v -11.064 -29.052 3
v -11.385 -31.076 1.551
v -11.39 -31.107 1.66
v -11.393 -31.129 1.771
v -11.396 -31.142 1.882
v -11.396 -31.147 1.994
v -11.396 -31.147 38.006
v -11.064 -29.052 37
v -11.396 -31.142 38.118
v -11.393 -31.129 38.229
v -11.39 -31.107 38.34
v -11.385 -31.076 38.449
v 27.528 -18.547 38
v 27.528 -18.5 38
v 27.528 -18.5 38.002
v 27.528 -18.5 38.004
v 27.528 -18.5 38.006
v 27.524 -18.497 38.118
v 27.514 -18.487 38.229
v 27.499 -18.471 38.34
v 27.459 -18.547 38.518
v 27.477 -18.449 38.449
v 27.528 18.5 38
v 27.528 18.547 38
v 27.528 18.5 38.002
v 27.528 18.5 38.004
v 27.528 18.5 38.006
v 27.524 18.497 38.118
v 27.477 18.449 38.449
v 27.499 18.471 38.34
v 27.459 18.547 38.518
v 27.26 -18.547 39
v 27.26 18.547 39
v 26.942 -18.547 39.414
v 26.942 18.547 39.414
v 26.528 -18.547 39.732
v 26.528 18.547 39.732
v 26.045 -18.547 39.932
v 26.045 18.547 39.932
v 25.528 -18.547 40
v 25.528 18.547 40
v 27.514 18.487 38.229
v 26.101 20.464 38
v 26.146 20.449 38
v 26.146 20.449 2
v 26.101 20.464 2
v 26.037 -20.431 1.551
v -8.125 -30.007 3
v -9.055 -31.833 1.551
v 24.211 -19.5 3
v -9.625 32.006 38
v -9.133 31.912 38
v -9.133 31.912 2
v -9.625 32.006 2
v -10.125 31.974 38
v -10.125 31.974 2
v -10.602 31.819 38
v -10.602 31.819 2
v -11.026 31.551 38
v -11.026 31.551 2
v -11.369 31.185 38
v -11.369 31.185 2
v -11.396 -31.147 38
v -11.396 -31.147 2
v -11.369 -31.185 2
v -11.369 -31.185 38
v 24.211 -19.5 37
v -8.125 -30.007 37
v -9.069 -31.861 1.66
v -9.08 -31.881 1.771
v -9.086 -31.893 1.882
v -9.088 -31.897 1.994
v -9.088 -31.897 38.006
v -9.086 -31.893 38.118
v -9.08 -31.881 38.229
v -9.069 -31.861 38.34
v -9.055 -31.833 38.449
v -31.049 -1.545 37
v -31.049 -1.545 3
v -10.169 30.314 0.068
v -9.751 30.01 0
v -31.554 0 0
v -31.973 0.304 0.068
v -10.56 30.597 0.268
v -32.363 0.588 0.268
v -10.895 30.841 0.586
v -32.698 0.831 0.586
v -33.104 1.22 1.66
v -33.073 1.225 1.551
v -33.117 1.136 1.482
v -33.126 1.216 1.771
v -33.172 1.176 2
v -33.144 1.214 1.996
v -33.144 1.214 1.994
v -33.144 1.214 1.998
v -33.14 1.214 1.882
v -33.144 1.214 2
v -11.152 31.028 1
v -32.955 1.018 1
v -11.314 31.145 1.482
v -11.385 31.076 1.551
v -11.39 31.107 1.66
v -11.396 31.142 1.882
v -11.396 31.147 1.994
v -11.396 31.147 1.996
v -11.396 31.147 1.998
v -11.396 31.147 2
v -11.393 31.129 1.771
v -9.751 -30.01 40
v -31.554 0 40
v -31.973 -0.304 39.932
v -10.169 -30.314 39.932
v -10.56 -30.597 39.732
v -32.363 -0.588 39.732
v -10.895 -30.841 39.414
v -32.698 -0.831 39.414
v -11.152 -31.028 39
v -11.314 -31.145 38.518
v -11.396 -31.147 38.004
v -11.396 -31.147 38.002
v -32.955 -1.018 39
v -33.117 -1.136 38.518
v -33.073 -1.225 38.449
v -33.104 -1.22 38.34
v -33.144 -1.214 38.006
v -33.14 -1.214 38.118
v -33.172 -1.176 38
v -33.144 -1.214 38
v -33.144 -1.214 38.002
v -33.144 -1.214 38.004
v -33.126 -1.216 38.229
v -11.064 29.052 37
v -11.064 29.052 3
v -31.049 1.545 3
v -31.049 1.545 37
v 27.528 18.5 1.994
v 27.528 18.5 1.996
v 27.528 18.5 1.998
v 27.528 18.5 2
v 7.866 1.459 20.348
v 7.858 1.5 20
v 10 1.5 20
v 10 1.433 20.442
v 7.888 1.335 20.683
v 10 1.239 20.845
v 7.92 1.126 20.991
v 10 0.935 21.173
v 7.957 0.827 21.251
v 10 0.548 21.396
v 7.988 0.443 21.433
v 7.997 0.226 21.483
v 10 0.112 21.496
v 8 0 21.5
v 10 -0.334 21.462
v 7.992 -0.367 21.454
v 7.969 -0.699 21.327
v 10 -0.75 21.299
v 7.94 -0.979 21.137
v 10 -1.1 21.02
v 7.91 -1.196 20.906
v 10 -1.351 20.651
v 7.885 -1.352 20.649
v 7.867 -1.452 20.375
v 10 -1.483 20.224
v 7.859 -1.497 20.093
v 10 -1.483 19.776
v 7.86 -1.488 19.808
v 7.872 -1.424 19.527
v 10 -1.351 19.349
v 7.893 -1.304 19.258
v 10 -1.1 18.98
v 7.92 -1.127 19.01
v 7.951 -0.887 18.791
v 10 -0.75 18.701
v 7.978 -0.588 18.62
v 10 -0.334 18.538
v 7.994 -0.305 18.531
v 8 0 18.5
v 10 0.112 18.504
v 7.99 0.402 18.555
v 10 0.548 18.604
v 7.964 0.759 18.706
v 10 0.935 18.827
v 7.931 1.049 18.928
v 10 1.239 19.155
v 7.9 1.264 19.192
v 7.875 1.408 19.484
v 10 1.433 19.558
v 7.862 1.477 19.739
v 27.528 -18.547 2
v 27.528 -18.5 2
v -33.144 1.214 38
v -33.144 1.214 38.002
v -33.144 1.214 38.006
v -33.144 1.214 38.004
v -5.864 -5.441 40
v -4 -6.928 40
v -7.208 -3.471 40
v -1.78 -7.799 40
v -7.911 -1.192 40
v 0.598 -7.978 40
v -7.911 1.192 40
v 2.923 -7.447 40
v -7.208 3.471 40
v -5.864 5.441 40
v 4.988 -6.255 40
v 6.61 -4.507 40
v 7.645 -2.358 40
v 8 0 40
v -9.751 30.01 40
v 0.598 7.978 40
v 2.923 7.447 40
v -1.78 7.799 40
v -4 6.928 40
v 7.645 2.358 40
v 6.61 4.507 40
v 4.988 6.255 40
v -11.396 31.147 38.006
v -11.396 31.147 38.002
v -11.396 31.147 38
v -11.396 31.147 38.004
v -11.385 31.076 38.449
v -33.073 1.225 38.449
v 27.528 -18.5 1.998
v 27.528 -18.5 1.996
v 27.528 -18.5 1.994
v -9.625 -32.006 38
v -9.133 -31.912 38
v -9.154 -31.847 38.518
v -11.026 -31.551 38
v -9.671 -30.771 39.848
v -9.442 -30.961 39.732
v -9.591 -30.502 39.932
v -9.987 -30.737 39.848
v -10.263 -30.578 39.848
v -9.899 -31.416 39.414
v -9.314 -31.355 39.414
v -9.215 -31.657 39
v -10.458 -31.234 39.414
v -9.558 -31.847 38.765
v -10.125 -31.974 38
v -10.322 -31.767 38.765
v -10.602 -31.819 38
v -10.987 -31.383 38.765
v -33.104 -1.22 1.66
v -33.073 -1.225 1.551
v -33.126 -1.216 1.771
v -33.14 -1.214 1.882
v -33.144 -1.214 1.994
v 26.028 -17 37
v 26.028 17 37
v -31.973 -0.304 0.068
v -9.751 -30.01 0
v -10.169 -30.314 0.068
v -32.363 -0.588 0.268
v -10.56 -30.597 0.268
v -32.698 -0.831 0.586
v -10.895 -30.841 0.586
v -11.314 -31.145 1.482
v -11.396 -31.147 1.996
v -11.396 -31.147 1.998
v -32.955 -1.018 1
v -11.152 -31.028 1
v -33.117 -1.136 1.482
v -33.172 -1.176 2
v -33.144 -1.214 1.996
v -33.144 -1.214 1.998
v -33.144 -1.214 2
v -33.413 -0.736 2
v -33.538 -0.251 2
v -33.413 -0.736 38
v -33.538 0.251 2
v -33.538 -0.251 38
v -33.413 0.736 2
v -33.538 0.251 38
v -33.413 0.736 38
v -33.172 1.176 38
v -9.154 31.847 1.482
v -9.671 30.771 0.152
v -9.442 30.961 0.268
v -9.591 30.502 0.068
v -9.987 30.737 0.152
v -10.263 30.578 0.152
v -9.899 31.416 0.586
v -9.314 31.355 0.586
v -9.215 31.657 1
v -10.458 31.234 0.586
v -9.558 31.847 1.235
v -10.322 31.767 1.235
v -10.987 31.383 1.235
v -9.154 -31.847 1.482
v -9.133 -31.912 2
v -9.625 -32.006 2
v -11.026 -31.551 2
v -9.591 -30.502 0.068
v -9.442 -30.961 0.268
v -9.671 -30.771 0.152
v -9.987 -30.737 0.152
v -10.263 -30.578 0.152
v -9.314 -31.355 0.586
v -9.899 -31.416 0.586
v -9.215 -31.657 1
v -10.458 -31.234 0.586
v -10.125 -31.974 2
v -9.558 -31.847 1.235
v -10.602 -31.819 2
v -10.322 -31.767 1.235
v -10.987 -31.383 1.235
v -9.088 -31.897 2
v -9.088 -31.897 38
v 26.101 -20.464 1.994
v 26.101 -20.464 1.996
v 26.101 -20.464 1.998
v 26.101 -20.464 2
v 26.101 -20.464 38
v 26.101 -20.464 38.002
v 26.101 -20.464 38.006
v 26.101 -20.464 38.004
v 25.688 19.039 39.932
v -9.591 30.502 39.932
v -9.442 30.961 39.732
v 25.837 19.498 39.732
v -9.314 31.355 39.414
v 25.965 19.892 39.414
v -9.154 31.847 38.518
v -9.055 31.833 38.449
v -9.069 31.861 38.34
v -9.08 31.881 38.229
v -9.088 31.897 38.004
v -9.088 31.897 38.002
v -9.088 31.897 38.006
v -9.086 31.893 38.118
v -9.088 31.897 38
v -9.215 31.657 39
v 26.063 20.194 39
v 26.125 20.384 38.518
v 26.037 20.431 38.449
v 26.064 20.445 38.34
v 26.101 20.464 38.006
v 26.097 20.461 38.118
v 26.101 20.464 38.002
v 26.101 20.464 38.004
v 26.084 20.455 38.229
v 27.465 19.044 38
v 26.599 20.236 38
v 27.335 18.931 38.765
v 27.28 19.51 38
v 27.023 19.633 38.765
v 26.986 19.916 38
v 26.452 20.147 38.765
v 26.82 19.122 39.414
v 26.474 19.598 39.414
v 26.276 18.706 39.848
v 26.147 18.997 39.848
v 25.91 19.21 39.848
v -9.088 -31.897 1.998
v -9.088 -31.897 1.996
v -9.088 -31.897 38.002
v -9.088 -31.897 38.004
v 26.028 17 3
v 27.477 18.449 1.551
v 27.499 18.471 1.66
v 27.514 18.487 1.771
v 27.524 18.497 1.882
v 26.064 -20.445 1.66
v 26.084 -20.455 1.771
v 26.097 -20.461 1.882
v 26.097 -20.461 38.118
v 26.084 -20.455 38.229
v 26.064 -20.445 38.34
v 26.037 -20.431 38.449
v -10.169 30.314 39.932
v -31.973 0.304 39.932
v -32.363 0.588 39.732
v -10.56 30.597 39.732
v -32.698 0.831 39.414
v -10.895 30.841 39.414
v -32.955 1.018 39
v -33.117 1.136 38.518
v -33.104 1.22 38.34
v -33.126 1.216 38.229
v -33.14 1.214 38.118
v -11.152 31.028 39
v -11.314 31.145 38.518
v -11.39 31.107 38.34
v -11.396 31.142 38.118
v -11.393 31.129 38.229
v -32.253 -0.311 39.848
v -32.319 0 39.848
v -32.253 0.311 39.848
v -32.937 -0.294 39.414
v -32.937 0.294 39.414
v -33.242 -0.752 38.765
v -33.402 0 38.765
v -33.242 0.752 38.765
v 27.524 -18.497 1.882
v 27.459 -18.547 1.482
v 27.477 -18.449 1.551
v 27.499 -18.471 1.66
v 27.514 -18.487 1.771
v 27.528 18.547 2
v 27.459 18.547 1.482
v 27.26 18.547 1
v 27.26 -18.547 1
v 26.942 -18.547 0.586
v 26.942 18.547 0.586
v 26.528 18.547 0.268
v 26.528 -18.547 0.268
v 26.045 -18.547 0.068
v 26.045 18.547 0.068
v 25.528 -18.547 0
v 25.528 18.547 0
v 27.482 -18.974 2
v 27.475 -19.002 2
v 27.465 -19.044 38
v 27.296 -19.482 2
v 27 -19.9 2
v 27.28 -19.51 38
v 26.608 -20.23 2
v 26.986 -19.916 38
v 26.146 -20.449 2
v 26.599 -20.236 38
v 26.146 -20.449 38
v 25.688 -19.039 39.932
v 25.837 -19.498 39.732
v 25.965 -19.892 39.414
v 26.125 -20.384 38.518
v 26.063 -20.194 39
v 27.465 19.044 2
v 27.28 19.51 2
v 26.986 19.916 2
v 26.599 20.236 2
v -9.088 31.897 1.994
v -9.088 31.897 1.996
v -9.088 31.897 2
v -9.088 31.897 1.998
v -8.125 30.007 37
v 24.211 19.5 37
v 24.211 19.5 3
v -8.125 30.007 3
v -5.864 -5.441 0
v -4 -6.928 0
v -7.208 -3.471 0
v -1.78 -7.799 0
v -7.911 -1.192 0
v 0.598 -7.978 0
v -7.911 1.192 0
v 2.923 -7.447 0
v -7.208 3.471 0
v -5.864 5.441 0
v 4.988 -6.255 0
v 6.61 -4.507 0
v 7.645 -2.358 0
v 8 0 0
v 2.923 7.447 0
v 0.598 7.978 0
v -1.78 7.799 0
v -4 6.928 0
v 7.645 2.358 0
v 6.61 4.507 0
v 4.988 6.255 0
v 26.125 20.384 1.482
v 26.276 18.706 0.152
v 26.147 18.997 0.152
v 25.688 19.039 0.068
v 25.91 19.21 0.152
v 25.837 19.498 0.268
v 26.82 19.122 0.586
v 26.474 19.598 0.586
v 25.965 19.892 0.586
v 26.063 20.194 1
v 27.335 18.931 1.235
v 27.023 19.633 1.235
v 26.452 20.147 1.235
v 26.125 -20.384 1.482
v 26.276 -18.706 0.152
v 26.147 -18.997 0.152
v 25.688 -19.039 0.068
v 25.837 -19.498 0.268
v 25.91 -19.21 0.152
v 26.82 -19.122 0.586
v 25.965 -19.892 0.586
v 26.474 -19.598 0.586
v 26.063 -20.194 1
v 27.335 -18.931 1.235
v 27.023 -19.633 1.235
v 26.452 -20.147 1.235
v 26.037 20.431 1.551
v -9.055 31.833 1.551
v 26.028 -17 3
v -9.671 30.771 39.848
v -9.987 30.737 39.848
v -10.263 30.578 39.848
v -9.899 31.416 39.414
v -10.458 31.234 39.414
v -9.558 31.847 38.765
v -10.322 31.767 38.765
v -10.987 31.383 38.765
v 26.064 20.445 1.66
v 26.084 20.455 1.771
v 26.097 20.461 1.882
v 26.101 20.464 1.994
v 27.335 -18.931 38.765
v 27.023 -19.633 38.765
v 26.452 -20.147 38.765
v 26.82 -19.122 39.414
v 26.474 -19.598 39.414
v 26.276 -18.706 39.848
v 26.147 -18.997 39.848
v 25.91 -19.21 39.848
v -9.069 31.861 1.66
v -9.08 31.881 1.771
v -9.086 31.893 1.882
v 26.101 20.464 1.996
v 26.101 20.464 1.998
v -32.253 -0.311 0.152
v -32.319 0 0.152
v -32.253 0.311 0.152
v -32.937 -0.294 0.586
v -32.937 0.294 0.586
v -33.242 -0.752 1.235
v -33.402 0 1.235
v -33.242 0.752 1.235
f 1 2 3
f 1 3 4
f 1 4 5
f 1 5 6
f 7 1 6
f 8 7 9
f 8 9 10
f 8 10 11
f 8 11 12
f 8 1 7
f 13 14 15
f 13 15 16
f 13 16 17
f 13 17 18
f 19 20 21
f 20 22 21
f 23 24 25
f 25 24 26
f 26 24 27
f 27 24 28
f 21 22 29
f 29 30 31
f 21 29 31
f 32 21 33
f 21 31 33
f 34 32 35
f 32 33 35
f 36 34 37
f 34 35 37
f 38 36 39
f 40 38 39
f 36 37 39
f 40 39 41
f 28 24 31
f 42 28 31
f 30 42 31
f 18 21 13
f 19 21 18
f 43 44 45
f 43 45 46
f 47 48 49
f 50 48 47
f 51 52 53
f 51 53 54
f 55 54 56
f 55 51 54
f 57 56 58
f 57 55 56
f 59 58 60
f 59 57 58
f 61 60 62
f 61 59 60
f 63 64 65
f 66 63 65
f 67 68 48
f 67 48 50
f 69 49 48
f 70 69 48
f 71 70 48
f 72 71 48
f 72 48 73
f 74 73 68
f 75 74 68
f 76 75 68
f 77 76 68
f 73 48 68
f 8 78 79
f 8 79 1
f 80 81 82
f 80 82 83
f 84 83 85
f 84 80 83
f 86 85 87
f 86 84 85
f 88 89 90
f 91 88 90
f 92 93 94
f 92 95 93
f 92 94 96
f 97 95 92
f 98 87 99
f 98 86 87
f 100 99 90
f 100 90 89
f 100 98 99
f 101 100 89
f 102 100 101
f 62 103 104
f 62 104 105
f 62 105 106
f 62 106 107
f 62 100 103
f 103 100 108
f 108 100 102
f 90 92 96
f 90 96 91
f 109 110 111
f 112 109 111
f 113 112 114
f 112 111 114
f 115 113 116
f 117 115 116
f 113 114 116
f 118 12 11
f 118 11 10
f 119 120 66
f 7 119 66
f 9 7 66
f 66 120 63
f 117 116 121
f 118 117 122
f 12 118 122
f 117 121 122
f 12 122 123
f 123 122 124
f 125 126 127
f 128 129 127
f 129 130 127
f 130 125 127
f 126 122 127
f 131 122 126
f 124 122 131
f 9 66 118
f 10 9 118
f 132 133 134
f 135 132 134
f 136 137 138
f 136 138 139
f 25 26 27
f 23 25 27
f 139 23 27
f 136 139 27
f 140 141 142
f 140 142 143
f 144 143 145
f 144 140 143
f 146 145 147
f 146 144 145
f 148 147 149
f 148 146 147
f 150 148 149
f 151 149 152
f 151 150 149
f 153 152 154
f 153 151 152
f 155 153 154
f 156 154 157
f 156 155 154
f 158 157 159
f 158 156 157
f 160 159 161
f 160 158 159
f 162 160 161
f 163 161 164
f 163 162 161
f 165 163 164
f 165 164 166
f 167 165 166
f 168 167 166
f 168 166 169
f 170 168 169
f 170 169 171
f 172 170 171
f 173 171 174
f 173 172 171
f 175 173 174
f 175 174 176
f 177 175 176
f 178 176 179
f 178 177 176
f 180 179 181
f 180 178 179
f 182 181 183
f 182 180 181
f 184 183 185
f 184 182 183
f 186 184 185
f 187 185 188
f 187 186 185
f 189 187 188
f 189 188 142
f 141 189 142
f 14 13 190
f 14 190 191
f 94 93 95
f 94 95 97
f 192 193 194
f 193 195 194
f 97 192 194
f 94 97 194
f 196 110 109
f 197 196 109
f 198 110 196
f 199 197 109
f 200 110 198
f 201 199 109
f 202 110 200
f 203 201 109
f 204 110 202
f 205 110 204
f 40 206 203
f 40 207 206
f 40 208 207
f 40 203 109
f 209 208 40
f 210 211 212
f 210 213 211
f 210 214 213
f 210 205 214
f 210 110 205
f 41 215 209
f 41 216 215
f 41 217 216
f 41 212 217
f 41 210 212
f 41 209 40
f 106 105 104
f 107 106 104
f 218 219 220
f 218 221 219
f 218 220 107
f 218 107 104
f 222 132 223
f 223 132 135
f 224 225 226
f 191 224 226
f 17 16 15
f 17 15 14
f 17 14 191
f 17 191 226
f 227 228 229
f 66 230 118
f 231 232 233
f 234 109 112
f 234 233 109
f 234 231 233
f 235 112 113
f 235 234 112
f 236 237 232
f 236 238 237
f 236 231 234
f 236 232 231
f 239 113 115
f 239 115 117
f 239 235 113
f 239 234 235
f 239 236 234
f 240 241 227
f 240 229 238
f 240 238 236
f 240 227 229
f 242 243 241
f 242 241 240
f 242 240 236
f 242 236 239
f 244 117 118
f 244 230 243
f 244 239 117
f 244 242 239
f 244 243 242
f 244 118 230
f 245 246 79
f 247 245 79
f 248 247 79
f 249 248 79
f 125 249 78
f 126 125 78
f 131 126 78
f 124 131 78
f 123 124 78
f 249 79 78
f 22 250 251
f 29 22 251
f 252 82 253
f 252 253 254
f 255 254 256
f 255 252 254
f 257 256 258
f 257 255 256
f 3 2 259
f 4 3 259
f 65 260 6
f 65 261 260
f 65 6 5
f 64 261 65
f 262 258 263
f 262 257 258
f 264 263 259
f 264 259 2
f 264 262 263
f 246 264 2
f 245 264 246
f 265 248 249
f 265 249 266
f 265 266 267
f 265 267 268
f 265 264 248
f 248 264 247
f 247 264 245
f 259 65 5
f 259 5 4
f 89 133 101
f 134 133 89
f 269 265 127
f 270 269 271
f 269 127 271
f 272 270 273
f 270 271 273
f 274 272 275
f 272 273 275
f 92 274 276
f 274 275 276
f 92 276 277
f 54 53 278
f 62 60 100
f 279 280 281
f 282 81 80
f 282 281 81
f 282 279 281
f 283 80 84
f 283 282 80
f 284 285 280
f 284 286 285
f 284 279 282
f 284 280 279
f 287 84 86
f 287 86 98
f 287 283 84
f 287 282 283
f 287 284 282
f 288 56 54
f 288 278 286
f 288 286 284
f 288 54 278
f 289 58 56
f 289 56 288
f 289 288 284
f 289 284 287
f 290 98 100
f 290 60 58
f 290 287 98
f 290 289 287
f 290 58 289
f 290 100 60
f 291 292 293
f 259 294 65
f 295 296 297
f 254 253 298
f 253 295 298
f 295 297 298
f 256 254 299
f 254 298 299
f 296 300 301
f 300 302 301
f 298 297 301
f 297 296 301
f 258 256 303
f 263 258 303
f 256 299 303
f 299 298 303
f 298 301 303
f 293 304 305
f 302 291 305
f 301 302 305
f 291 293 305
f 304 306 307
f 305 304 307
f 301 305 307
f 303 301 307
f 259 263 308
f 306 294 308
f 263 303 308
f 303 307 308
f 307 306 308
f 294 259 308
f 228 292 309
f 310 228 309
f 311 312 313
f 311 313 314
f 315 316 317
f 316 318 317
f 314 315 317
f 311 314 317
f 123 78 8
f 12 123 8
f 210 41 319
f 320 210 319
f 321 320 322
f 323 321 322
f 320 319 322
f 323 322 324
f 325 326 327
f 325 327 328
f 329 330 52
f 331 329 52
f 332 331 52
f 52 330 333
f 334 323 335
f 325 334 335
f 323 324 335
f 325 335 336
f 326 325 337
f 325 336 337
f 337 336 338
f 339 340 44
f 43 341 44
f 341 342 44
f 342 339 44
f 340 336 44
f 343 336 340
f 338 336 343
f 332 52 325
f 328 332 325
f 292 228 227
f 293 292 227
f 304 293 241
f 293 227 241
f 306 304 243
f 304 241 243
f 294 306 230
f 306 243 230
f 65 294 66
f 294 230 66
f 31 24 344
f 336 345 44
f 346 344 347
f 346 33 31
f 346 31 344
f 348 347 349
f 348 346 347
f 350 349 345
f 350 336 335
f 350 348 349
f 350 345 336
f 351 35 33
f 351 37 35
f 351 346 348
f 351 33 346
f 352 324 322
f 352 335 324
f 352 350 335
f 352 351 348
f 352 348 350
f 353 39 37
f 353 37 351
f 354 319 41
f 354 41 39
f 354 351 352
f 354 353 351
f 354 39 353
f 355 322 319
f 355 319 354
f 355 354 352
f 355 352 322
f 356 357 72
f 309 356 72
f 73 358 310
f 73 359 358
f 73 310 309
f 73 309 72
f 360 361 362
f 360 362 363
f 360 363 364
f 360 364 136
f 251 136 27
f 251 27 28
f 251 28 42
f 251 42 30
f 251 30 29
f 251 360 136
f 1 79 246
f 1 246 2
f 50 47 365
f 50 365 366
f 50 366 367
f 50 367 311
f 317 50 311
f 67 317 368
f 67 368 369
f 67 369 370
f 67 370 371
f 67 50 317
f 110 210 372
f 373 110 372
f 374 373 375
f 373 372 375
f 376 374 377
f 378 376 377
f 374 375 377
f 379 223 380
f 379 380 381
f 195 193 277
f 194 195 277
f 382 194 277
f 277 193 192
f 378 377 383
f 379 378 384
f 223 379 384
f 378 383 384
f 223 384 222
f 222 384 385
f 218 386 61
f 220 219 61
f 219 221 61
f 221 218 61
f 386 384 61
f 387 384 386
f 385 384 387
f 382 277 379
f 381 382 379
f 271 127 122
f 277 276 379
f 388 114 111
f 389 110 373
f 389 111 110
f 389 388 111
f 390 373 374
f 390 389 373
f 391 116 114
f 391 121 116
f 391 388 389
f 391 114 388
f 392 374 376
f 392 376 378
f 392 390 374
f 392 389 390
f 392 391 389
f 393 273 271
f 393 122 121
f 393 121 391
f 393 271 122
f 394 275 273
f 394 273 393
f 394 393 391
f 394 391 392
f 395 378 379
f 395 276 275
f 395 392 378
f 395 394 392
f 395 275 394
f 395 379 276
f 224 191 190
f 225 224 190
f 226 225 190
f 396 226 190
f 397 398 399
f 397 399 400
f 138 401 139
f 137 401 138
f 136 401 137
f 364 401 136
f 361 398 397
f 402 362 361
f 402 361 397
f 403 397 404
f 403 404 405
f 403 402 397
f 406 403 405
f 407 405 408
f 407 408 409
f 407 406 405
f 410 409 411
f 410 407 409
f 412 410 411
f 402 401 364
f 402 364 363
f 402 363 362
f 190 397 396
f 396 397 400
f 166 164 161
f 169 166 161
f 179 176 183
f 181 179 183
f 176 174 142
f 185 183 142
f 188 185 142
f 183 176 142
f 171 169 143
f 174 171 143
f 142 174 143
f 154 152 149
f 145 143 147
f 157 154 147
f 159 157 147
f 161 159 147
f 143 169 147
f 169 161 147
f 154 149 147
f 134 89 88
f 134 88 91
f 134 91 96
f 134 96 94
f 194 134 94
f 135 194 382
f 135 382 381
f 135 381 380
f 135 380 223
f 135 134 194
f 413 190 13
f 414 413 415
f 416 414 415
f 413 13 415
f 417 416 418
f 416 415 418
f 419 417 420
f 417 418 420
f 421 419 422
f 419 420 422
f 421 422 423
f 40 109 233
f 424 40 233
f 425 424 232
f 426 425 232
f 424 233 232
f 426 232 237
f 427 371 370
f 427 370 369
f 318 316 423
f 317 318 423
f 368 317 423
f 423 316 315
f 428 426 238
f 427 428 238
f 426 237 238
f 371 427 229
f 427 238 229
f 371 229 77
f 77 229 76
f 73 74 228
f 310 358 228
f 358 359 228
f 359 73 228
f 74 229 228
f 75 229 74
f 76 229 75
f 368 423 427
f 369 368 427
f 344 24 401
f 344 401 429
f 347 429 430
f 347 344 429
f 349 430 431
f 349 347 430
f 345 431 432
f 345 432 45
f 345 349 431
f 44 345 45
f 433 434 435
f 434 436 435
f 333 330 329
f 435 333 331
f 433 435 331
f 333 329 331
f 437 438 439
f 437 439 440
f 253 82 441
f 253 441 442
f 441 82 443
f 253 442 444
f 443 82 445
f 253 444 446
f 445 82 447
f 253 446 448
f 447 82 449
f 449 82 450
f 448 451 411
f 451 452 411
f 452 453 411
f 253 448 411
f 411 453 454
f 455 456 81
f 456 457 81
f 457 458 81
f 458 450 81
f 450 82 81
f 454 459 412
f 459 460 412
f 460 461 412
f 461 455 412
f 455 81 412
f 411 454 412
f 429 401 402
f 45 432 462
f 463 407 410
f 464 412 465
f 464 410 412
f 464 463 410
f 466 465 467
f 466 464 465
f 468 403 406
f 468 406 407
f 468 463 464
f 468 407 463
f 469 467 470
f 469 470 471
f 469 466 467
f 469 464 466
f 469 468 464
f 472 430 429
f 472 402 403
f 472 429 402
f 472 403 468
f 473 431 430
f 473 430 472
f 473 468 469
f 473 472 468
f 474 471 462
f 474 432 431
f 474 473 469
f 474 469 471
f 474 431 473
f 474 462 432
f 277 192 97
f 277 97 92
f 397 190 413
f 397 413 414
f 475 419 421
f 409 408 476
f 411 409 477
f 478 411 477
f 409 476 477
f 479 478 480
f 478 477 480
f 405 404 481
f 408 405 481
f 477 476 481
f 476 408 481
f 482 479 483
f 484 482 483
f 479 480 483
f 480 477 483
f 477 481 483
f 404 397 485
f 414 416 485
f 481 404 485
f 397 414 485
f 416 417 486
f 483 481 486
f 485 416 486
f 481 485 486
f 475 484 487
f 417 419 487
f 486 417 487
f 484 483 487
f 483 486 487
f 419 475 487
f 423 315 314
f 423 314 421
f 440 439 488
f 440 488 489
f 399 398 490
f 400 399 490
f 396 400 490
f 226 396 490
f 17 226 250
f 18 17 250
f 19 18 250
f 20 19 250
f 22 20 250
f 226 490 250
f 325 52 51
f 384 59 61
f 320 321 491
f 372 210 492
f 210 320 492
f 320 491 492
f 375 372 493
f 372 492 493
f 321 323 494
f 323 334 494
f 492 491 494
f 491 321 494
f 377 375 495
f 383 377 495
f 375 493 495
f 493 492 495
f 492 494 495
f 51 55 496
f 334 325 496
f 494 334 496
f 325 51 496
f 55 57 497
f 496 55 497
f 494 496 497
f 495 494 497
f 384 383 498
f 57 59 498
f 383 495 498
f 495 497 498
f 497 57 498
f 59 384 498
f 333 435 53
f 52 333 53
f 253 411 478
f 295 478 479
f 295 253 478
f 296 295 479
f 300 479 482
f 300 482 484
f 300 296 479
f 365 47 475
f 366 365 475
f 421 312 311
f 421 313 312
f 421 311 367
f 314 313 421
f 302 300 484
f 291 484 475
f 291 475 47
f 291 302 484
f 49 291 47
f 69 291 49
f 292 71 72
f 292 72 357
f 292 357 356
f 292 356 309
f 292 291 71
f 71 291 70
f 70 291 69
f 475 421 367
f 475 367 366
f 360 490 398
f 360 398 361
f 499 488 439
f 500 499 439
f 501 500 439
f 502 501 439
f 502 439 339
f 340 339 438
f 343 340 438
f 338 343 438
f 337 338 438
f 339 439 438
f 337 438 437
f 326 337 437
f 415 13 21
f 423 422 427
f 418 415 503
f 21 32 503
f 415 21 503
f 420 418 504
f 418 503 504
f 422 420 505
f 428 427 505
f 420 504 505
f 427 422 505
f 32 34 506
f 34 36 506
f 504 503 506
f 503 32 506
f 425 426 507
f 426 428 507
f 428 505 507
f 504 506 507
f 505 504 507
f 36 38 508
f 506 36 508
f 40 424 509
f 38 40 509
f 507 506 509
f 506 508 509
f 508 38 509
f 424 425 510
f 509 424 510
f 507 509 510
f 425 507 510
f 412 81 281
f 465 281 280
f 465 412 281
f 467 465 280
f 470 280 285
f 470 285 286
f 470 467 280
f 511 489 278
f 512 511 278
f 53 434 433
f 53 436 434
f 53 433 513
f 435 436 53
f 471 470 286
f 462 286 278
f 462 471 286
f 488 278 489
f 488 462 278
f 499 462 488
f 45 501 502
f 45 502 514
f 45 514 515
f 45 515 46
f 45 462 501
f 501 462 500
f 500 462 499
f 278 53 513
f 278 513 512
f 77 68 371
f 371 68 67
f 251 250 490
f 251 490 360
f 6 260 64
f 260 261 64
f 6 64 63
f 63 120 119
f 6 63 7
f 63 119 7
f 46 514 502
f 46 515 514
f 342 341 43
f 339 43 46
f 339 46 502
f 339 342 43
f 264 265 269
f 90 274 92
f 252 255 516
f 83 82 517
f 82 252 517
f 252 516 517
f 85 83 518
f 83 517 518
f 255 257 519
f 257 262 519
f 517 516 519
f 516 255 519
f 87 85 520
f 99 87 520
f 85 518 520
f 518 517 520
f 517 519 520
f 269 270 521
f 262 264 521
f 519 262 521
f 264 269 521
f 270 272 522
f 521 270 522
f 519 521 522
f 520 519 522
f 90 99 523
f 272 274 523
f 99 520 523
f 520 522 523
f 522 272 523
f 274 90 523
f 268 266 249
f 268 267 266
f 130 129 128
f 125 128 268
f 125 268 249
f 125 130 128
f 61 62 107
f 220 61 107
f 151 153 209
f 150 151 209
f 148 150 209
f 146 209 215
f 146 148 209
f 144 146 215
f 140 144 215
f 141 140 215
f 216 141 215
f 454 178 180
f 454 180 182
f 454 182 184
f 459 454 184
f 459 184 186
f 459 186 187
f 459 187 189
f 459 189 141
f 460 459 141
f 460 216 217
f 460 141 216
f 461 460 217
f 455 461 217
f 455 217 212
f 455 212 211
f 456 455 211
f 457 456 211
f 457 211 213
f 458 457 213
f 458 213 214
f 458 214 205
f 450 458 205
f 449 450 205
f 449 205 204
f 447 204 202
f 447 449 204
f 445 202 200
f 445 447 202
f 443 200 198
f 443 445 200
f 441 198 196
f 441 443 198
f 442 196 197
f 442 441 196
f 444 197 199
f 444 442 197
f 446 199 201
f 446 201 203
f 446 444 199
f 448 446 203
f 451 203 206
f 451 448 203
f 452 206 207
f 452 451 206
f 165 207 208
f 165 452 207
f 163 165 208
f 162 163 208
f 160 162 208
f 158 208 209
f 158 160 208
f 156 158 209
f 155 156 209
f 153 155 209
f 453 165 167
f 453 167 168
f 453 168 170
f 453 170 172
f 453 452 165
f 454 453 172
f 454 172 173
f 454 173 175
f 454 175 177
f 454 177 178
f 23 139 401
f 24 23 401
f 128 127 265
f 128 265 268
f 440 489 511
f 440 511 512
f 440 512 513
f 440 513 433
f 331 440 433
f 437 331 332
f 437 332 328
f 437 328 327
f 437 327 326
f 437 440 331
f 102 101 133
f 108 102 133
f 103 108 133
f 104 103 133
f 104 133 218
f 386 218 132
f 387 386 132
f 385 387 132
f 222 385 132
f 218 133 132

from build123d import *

# Parameters (mm, degrees)
F0_R            = 8
F1_DEPTH        = 40
F2_W            = 37
F2_H            = 37
F3_DEPTH        = 1.5
F3_COPIES_COUNT = 5
F4_SIZE         = 1.49999
F5_R            = 3
F6_DEPTH        = 20
F7_R            = 2
F8_T1_DEPTH     = 37.093829888
F8_T3_DEPTH     = 37.093829888
F8_T5_DEPTH     = 37.093829888
F8_T7_DEPTH     = 37.093829888
F8_T9_DEPTH     = 37.093829888
F8_T12_ANGLE    = 72
F8_T14_ANGLE    = 72
F8_T16_ANGLE    = 72
F8_T18_ANGLE    = 72
F8_T20_ANGLE    = 72
F8_T22_ANGLE    = 72
F8_T24_ANGLE    = 72
F8_T26_ANGLE    = 72
F8_T28_ANGLE    = 72
F8_T30_ANGLE    = 72
F9_R            = 1.5
F10_DEPTH       = 10


# Not quite as in the source:
# - a fillet or chamfer that OpenCascade refuses, or shapes differently, is made with other operations: its cross-section is extruded or revolved along the edge and cut away or added
# - a fillet or chamfer is up to 0.001 mm smaller than in the source, because OpenCascade refuses the exact size
# - a pattern or mirror of a feature is missing from the dataset's text; its kind, count and spacing are read off the source's solid


with BuildPart() as f1:
    # F0 (on Top) → F1 (new body)
    with BuildSketch(Plane.XY):
        Polygon((27.5276384094, -20), (27.5276384094, 20), (-10.5146222424, 32.360679775), (-34.0260323341, 0), (-10.5146222424, -32.360679775), align=None)
        Circle(F0_R, mode=Mode.SUBTRACT)
    extrude(amount=F1_DEPTH)

    # F2 (on face) → F3 (cut)
    with BuildSketch(Plane.YZ.offset(27.5276384094)):
        with Locations((0, 20)):
            Rectangle(F2_W, F2_H)
    f3 = extrude(amount=-F3_DEPTH, mode=Mode.SUBTRACT)

    # F3_copies: F3 ×5 about axis
    f3_copies_axis = Axis((0, 0, 0), (0, 0, 1))
    for i in range(1, F3_COPIES_COUNT):
        add(f3.rotate(f3_copies_axis, i * 360 / F3_COPIES_COUNT), mode=Mode.SUBTRACT)

    # F4 (size 1.5 in the source; OpenCascade refuses exactly that, so slightly less here)
    f4_edges = [f1.edges().sort_by_distance(p)[0] for p in [
        (26.027638, 0, 38.5),
        (26.027638, -18.5, 20),
        (26.027638, 0, 1.5),
        (26.027638, 18.5, 20),
        (25.637528, -19.036941, 20),
        (8.042983, -24.753755, 1.5),
        (-9.551563, -30.47057, 20),
        (8.042983, -24.753755, 38.5),
        (-9.551563, 30.47057, 20),
        (8.042983, 24.753755, 1.5),
        (25.637528, 19.036941, 20),
        (8.042983, 24.753755, 38.5),
        (-10.182775, -30.265476, 20),
        (-21.056802, -15.298662, 1.5),
        (-31.930829, -0.331848, 20),
        (-21.056802, -15.298662, 38.5),
        (-31.930829, 0.331848, 20),
        (-21.056802, 15.298662, 1.5),
        (-10.182775, 30.265476, 20),
        (-21.056802, 15.298662, 38.5),
    ]]
    chamfer(f4_edges, length=F4_SIZE)

    # F5 (on Right) → F6 (cut)
    with BuildSketch(Plane.YZ):
        with Locations((0, 49.5)):
            Circle(F5_R)
    extrude(amount=F6_DEPTH, mode=Mode.SUBTRACT)

    # F7
    f7_edges = [f1.edges().sort_by_distance(p)[0] for p in [
        (-34.026032, 0, 20),
        (-10.514622, -32.36068, 20),
        (27.527638, -20, 20),
        (27.527638, 20, 20),
        (-10.514622, 32.36068, 20),
    ]]
    fillet(f7_edges, radius=F7_R)

    # F8: fillet of radius 2 on 12 edges, made by hand

    # F8_s2 → F8_t1 (cut)
    with BuildSketch(Plane(origin=(-17.6391643147, -5.7313119109, 0), x_dir=(0, 0, 1), z_dir=(0.9510565163, 0.3090169944, 0))):
        with BuildLine():
            ThreePointArc((40, 25.5276384094), (39.4142135624, 26.9418519718), (38, 27.5276384094))
            Line((38, 27.5276384094), (40, 27.5276384094))
            Line((40, 27.5276384094), (40, 25.5276384094))
        make_face()
        with BuildLine():
            ThreePointArc((0, 25.5276384094), (0.5857864376, 26.9418519718), (2, 27.5276384094))
            Line((2, 27.5276384094), (0, 27.5276384094))
            Line((0, 27.5276384094), (0, 25.5276384094))
        make_face()
    extrude(amount=F8_T1_DEPTH, mode=Mode.SUBTRACT)

    # F8_s4 → F8_t3 (cut)
    with BuildSketch(Plane(origin=(-10.9016030796, 15.0047693829, 0), x_dir=(0, 0, 1), z_dir=(0.5877852523, -0.8090169944, 0))):
        with BuildLine():
            ThreePointArc((40, 25.5276384094), (39.4142135624, 26.9418519718), (38, 27.5276384094))
            Line((38, 27.5276384094), (40, 27.5276384094))
            Line((40, 27.5276384094), (40, 25.5276384094))
        make_face()
        with BuildLine():
            ThreePointArc((0, 25.5276384094), (0.5857864376, 26.9418519718), (2, 27.5276384094))
            Line((2, 27.5276384094), (0, 27.5276384094))
            Line((0, 27.5276384094), (0, 25.5276384094))
        make_face()
    extrude(amount=F8_T3_DEPTH, mode=Mode.SUBTRACT)

    # F8_s6 → F8_t5 (cut)
    with BuildSketch(Plane(origin=(10.9016030796, 15.0047693829, 0), x_dir=(0, 0, 1), z_dir=(-0.5877852523, -0.8090169944, 0))):
        with BuildLine():
            ThreePointArc((40, 25.5276384094), (39.4142135624, 26.9418519718), (38, 27.5276384094))
            Line((38, 27.5276384094), (40, 27.5276384094))
            Line((40, 27.5276384094), (40, 25.5276384094))
        make_face()
        with BuildLine():
            ThreePointArc((0, 25.5276384094), (0.5857864376, 26.9418519718), (2, 27.5276384094))
            Line((2, 27.5276384094), (0, 27.5276384094))
            Line((0, 27.5276384094), (0, 25.5276384094))
        make_face()
    extrude(amount=F8_T5_DEPTH, mode=Mode.SUBTRACT)

    # F8_s8 → F8_t7 (cut)
    with BuildSketch(Plane(origin=(17.6391643147, -5.7313119109, 0), x_dir=(0, 0, 1), z_dir=(-0.9510565163, 0.3090169944, 0))):
        with BuildLine():
            ThreePointArc((40, 25.5276384094), (39.4142135624, 26.9418519718), (38, 27.5276384094))
            Line((38, 27.5276384094), (40, 27.5276384094))
            Line((40, 27.5276384094), (40, 25.5276384094))
        make_face()
        with BuildLine():
            ThreePointArc((0, 25.5276384094), (0.5857864376, 26.9418519718), (2, 27.5276384094))
            Line((2, 27.5276384094), (0, 27.5276384094))
            Line((0, 27.5276384094), (0, 25.5276384094))
        make_face()
    extrude(amount=F8_T7_DEPTH, mode=Mode.SUBTRACT)

    # F8_s10 → F8_t9 (cut)
    with BuildSketch(Plane.XZ.offset(-18.546914944)):
        with BuildLine():
            ThreePointArc((27.5276384094, 38), (26.9418519718, 39.4142135624), (25.5276384094, 40))
            Line((25.5276384094, 40), (27.5276384094, 40))
            Line((27.5276384094, 40), (27.5276384094, 38))
        make_face()
        with BuildLine():
            ThreePointArc((27.5276384094, 2), (26.9418519718, 0.5857864376), (25.5276384094, 0))
            Line((25.5276384094, 0), (27.5276384094, 0))
            Line((27.5276384094, 0), (27.5276384094, 2))
        make_face()
    extrude(amount=F8_T9_DEPTH, mode=Mode.SUBTRACT)

    # F8_s11 → F8_t12 (revolve, cut)
    with BuildSketch(Plane.XZ.offset(18.546914944)):
        with BuildLine():
            ThreePointArc((25.5276384094, 0), (26.9418519718, 0.5857864376), (27.5276384094, 2))
            Line((27.5276384094, 2), (27.5276384094, 0))
            Line((27.5276384094, 0), (25.5276384094, 0))
        make_face()
    revolve(axis=Axis((25.5276384094, -18.546914944, 0), (0, 0, -1)), revolution_arc=F8_T12_ANGLE, mode=Mode.SUBTRACT)

    # F8_s13 → F8_t14 (revolve, cut)
    with BuildSketch(Plane.XZ.offset(-18.546914944)):
        with BuildLine():
            ThreePointArc((25.5276384094, 0), (26.9418519718, 0.5857864376), (27.5276384094, 2))
            Line((27.5276384094, 2), (27.5276384094, 0))
            Line((27.5276384094, 0), (25.5276384094, 0))
        make_face()
    revolve(axis=Axis((25.5276384094, 18.546914944, 0), (0, 0, 1)), revolution_arc=F8_T14_ANGLE, mode=Mode.SUBTRACT)

    # F8_s15 → F8_t16 (revolve, cut)
    with BuildSketch(Plane(origin=(-17.6391643147, -5.7313119109, 0), x_dir=(0, 0, 1), z_dir=(0.9510565163, 0.3090169944, 0))):
        with BuildLine():
            ThreePointArc((0, 25.5276384094), (0.5857864376, 26.9418519718), (2, 27.5276384094))
            Line((2, 27.5276384094), (0, 27.5276384094))
            Line((0, 27.5276384094), (0, 25.5276384094))
        make_face()
    revolve(axis=Axis((-9.7506902199, -30.0095387658, 0), (0, 0, -1)), revolution_arc=F8_T16_ANGLE, mode=Mode.SUBTRACT)

    # F8_s17 → F8_t18 (revolve, cut)
    with BuildSketch(Plane(origin=(-17.6391643147, 5.7313119109, 0), x_dir=(0, 0, 1), z_dir=(0.9510565163, -0.3090169944, 0))):
        with BuildLine():
            ThreePointArc((0, -25.5276384094), (0.5857864376, -26.9418519718), (2, -27.5276384094))
            Line((2, -27.5276384094), (0, -27.5276384094))
            Line((0, -27.5276384094), (0, -25.5276384094))
        make_face()
    revolve(axis=Axis((-9.7506902199, 30.0095387658, 0), (0, 0, 1)), revolution_arc=F8_T18_ANGLE, mode=Mode.SUBTRACT)

    # F8_s19 → F8_t20 (revolve, cut)
    with BuildSketch(Plane(origin=(-10.9016030796, 15.0047693829, 0), x_dir=(0, 0, 1), z_dir=(0.5877852523, -0.8090169944, 0))):
        with BuildLine():
            ThreePointArc((0, 25.5276384094), (0.5857864376, 26.9418519718), (2, 27.5276384094))
            Line((2, 27.5276384094), (0, 27.5276384094))
            Line((0, 27.5276384094), (0, 25.5276384094))
        make_face()
    revolve(axis=Axis((-31.5538963791, 0, 0), (0, 0, -1)), revolution_arc=F8_T20_ANGLE, mode=Mode.SUBTRACT)

    # F8_s21 → F8_t22 (revolve, cut)
    with BuildSketch(Plane.XZ.offset(18.546914944)):
        with BuildLine():
            ThreePointArc((27.5276384094, 38), (26.9418519718, 39.4142135624), (25.5276384094, 40))
            Line((25.5276384094, 40), (27.5276384094, 40))
            Line((27.5276384094, 40), (27.5276384094, 38))
        make_face()
    revolve(axis=Axis((25.5276384094, -18.546914944, 40), (0, 0, -1)), revolution_arc=F8_T22_ANGLE, mode=Mode.SUBTRACT)

    # F8_s23 → F8_t24 (revolve, cut)
    with BuildSketch(Plane.XZ.offset(-18.546914944)):
        with BuildLine():
            ThreePointArc((27.5276384094, 38), (26.9418519718, 39.4142135624), (25.5276384094, 40))
            Line((25.5276384094, 40), (27.5276384094, 40))
            Line((27.5276384094, 40), (27.5276384094, 38))
        make_face()
    revolve(axis=Axis((25.5276384094, 18.546914944, 40), (0, 0, 1)), revolution_arc=F8_T24_ANGLE, mode=Mode.SUBTRACT)

    # F8_s25 → F8_t26 (revolve, cut)
    with BuildSketch(Plane(origin=(-17.6391643147, -5.7313119109, 0), x_dir=(0, 0, 1), z_dir=(0.9510565163, 0.3090169944, 0))):
        with BuildLine():
            ThreePointArc((40, 25.5276384094), (39.4142135624, 26.9418519718), (38, 27.5276384094))
            Line((38, 27.5276384094), (40, 27.5276384094))
            Line((40, 27.5276384094), (40, 25.5276384094))
        make_face()
    revolve(axis=Axis((-9.7506902199, -30.0095387658, 40), (0, 0, -1)), revolution_arc=F8_T26_ANGLE, mode=Mode.SUBTRACT)

    # F8_s27 → F8_t28 (revolve, cut)
    with BuildSketch(Plane(origin=(-17.6391643147, 5.7313119109, 0), x_dir=(0, 0, 1), z_dir=(0.9510565163, -0.3090169944, 0))):
        with BuildLine():
            ThreePointArc((40, -25.5276384094), (39.4142135624, -26.9418519718), (38, -27.5276384094))
            Line((38, -27.5276384094), (40, -27.5276384094))
            Line((40, -27.5276384094), (40, -25.5276384094))
        make_face()
    revolve(axis=Axis((-9.7506902199, 30.0095387658, 40), (0, 0, 1)), revolution_arc=F8_T28_ANGLE, mode=Mode.SUBTRACT)

    # F8_s29 → F8_t30 (revolve, cut)
    with BuildSketch(Plane(origin=(-10.9016030796, 15.0047693829, 0), x_dir=(0, 0, 1), z_dir=(0.5877852523, -0.8090169944, 0))):
        with BuildLine():
            ThreePointArc((40, 25.5276384094), (39.4142135624, 26.9418519718), (38, 27.5276384094))
            Line((38, 27.5276384094), (40, 27.5276384094))
            Line((40, 27.5276384094), (40, 25.5276384094))
        make_face()
    revolve(axis=Axis((-31.5538963791, 0, 40), (0, 0, -1)), revolution_arc=F8_T30_ANGLE, mode=Mode.SUBTRACT)

    # F9 (on Right) → F10 (cut)
    with BuildSketch(Plane.YZ):
        with Locations((0, 20)):
            Circle(F9_R)
    extrude(amount=F10_DEPTH, mode=Mode.SUBTRACT)


solid = f1.part
